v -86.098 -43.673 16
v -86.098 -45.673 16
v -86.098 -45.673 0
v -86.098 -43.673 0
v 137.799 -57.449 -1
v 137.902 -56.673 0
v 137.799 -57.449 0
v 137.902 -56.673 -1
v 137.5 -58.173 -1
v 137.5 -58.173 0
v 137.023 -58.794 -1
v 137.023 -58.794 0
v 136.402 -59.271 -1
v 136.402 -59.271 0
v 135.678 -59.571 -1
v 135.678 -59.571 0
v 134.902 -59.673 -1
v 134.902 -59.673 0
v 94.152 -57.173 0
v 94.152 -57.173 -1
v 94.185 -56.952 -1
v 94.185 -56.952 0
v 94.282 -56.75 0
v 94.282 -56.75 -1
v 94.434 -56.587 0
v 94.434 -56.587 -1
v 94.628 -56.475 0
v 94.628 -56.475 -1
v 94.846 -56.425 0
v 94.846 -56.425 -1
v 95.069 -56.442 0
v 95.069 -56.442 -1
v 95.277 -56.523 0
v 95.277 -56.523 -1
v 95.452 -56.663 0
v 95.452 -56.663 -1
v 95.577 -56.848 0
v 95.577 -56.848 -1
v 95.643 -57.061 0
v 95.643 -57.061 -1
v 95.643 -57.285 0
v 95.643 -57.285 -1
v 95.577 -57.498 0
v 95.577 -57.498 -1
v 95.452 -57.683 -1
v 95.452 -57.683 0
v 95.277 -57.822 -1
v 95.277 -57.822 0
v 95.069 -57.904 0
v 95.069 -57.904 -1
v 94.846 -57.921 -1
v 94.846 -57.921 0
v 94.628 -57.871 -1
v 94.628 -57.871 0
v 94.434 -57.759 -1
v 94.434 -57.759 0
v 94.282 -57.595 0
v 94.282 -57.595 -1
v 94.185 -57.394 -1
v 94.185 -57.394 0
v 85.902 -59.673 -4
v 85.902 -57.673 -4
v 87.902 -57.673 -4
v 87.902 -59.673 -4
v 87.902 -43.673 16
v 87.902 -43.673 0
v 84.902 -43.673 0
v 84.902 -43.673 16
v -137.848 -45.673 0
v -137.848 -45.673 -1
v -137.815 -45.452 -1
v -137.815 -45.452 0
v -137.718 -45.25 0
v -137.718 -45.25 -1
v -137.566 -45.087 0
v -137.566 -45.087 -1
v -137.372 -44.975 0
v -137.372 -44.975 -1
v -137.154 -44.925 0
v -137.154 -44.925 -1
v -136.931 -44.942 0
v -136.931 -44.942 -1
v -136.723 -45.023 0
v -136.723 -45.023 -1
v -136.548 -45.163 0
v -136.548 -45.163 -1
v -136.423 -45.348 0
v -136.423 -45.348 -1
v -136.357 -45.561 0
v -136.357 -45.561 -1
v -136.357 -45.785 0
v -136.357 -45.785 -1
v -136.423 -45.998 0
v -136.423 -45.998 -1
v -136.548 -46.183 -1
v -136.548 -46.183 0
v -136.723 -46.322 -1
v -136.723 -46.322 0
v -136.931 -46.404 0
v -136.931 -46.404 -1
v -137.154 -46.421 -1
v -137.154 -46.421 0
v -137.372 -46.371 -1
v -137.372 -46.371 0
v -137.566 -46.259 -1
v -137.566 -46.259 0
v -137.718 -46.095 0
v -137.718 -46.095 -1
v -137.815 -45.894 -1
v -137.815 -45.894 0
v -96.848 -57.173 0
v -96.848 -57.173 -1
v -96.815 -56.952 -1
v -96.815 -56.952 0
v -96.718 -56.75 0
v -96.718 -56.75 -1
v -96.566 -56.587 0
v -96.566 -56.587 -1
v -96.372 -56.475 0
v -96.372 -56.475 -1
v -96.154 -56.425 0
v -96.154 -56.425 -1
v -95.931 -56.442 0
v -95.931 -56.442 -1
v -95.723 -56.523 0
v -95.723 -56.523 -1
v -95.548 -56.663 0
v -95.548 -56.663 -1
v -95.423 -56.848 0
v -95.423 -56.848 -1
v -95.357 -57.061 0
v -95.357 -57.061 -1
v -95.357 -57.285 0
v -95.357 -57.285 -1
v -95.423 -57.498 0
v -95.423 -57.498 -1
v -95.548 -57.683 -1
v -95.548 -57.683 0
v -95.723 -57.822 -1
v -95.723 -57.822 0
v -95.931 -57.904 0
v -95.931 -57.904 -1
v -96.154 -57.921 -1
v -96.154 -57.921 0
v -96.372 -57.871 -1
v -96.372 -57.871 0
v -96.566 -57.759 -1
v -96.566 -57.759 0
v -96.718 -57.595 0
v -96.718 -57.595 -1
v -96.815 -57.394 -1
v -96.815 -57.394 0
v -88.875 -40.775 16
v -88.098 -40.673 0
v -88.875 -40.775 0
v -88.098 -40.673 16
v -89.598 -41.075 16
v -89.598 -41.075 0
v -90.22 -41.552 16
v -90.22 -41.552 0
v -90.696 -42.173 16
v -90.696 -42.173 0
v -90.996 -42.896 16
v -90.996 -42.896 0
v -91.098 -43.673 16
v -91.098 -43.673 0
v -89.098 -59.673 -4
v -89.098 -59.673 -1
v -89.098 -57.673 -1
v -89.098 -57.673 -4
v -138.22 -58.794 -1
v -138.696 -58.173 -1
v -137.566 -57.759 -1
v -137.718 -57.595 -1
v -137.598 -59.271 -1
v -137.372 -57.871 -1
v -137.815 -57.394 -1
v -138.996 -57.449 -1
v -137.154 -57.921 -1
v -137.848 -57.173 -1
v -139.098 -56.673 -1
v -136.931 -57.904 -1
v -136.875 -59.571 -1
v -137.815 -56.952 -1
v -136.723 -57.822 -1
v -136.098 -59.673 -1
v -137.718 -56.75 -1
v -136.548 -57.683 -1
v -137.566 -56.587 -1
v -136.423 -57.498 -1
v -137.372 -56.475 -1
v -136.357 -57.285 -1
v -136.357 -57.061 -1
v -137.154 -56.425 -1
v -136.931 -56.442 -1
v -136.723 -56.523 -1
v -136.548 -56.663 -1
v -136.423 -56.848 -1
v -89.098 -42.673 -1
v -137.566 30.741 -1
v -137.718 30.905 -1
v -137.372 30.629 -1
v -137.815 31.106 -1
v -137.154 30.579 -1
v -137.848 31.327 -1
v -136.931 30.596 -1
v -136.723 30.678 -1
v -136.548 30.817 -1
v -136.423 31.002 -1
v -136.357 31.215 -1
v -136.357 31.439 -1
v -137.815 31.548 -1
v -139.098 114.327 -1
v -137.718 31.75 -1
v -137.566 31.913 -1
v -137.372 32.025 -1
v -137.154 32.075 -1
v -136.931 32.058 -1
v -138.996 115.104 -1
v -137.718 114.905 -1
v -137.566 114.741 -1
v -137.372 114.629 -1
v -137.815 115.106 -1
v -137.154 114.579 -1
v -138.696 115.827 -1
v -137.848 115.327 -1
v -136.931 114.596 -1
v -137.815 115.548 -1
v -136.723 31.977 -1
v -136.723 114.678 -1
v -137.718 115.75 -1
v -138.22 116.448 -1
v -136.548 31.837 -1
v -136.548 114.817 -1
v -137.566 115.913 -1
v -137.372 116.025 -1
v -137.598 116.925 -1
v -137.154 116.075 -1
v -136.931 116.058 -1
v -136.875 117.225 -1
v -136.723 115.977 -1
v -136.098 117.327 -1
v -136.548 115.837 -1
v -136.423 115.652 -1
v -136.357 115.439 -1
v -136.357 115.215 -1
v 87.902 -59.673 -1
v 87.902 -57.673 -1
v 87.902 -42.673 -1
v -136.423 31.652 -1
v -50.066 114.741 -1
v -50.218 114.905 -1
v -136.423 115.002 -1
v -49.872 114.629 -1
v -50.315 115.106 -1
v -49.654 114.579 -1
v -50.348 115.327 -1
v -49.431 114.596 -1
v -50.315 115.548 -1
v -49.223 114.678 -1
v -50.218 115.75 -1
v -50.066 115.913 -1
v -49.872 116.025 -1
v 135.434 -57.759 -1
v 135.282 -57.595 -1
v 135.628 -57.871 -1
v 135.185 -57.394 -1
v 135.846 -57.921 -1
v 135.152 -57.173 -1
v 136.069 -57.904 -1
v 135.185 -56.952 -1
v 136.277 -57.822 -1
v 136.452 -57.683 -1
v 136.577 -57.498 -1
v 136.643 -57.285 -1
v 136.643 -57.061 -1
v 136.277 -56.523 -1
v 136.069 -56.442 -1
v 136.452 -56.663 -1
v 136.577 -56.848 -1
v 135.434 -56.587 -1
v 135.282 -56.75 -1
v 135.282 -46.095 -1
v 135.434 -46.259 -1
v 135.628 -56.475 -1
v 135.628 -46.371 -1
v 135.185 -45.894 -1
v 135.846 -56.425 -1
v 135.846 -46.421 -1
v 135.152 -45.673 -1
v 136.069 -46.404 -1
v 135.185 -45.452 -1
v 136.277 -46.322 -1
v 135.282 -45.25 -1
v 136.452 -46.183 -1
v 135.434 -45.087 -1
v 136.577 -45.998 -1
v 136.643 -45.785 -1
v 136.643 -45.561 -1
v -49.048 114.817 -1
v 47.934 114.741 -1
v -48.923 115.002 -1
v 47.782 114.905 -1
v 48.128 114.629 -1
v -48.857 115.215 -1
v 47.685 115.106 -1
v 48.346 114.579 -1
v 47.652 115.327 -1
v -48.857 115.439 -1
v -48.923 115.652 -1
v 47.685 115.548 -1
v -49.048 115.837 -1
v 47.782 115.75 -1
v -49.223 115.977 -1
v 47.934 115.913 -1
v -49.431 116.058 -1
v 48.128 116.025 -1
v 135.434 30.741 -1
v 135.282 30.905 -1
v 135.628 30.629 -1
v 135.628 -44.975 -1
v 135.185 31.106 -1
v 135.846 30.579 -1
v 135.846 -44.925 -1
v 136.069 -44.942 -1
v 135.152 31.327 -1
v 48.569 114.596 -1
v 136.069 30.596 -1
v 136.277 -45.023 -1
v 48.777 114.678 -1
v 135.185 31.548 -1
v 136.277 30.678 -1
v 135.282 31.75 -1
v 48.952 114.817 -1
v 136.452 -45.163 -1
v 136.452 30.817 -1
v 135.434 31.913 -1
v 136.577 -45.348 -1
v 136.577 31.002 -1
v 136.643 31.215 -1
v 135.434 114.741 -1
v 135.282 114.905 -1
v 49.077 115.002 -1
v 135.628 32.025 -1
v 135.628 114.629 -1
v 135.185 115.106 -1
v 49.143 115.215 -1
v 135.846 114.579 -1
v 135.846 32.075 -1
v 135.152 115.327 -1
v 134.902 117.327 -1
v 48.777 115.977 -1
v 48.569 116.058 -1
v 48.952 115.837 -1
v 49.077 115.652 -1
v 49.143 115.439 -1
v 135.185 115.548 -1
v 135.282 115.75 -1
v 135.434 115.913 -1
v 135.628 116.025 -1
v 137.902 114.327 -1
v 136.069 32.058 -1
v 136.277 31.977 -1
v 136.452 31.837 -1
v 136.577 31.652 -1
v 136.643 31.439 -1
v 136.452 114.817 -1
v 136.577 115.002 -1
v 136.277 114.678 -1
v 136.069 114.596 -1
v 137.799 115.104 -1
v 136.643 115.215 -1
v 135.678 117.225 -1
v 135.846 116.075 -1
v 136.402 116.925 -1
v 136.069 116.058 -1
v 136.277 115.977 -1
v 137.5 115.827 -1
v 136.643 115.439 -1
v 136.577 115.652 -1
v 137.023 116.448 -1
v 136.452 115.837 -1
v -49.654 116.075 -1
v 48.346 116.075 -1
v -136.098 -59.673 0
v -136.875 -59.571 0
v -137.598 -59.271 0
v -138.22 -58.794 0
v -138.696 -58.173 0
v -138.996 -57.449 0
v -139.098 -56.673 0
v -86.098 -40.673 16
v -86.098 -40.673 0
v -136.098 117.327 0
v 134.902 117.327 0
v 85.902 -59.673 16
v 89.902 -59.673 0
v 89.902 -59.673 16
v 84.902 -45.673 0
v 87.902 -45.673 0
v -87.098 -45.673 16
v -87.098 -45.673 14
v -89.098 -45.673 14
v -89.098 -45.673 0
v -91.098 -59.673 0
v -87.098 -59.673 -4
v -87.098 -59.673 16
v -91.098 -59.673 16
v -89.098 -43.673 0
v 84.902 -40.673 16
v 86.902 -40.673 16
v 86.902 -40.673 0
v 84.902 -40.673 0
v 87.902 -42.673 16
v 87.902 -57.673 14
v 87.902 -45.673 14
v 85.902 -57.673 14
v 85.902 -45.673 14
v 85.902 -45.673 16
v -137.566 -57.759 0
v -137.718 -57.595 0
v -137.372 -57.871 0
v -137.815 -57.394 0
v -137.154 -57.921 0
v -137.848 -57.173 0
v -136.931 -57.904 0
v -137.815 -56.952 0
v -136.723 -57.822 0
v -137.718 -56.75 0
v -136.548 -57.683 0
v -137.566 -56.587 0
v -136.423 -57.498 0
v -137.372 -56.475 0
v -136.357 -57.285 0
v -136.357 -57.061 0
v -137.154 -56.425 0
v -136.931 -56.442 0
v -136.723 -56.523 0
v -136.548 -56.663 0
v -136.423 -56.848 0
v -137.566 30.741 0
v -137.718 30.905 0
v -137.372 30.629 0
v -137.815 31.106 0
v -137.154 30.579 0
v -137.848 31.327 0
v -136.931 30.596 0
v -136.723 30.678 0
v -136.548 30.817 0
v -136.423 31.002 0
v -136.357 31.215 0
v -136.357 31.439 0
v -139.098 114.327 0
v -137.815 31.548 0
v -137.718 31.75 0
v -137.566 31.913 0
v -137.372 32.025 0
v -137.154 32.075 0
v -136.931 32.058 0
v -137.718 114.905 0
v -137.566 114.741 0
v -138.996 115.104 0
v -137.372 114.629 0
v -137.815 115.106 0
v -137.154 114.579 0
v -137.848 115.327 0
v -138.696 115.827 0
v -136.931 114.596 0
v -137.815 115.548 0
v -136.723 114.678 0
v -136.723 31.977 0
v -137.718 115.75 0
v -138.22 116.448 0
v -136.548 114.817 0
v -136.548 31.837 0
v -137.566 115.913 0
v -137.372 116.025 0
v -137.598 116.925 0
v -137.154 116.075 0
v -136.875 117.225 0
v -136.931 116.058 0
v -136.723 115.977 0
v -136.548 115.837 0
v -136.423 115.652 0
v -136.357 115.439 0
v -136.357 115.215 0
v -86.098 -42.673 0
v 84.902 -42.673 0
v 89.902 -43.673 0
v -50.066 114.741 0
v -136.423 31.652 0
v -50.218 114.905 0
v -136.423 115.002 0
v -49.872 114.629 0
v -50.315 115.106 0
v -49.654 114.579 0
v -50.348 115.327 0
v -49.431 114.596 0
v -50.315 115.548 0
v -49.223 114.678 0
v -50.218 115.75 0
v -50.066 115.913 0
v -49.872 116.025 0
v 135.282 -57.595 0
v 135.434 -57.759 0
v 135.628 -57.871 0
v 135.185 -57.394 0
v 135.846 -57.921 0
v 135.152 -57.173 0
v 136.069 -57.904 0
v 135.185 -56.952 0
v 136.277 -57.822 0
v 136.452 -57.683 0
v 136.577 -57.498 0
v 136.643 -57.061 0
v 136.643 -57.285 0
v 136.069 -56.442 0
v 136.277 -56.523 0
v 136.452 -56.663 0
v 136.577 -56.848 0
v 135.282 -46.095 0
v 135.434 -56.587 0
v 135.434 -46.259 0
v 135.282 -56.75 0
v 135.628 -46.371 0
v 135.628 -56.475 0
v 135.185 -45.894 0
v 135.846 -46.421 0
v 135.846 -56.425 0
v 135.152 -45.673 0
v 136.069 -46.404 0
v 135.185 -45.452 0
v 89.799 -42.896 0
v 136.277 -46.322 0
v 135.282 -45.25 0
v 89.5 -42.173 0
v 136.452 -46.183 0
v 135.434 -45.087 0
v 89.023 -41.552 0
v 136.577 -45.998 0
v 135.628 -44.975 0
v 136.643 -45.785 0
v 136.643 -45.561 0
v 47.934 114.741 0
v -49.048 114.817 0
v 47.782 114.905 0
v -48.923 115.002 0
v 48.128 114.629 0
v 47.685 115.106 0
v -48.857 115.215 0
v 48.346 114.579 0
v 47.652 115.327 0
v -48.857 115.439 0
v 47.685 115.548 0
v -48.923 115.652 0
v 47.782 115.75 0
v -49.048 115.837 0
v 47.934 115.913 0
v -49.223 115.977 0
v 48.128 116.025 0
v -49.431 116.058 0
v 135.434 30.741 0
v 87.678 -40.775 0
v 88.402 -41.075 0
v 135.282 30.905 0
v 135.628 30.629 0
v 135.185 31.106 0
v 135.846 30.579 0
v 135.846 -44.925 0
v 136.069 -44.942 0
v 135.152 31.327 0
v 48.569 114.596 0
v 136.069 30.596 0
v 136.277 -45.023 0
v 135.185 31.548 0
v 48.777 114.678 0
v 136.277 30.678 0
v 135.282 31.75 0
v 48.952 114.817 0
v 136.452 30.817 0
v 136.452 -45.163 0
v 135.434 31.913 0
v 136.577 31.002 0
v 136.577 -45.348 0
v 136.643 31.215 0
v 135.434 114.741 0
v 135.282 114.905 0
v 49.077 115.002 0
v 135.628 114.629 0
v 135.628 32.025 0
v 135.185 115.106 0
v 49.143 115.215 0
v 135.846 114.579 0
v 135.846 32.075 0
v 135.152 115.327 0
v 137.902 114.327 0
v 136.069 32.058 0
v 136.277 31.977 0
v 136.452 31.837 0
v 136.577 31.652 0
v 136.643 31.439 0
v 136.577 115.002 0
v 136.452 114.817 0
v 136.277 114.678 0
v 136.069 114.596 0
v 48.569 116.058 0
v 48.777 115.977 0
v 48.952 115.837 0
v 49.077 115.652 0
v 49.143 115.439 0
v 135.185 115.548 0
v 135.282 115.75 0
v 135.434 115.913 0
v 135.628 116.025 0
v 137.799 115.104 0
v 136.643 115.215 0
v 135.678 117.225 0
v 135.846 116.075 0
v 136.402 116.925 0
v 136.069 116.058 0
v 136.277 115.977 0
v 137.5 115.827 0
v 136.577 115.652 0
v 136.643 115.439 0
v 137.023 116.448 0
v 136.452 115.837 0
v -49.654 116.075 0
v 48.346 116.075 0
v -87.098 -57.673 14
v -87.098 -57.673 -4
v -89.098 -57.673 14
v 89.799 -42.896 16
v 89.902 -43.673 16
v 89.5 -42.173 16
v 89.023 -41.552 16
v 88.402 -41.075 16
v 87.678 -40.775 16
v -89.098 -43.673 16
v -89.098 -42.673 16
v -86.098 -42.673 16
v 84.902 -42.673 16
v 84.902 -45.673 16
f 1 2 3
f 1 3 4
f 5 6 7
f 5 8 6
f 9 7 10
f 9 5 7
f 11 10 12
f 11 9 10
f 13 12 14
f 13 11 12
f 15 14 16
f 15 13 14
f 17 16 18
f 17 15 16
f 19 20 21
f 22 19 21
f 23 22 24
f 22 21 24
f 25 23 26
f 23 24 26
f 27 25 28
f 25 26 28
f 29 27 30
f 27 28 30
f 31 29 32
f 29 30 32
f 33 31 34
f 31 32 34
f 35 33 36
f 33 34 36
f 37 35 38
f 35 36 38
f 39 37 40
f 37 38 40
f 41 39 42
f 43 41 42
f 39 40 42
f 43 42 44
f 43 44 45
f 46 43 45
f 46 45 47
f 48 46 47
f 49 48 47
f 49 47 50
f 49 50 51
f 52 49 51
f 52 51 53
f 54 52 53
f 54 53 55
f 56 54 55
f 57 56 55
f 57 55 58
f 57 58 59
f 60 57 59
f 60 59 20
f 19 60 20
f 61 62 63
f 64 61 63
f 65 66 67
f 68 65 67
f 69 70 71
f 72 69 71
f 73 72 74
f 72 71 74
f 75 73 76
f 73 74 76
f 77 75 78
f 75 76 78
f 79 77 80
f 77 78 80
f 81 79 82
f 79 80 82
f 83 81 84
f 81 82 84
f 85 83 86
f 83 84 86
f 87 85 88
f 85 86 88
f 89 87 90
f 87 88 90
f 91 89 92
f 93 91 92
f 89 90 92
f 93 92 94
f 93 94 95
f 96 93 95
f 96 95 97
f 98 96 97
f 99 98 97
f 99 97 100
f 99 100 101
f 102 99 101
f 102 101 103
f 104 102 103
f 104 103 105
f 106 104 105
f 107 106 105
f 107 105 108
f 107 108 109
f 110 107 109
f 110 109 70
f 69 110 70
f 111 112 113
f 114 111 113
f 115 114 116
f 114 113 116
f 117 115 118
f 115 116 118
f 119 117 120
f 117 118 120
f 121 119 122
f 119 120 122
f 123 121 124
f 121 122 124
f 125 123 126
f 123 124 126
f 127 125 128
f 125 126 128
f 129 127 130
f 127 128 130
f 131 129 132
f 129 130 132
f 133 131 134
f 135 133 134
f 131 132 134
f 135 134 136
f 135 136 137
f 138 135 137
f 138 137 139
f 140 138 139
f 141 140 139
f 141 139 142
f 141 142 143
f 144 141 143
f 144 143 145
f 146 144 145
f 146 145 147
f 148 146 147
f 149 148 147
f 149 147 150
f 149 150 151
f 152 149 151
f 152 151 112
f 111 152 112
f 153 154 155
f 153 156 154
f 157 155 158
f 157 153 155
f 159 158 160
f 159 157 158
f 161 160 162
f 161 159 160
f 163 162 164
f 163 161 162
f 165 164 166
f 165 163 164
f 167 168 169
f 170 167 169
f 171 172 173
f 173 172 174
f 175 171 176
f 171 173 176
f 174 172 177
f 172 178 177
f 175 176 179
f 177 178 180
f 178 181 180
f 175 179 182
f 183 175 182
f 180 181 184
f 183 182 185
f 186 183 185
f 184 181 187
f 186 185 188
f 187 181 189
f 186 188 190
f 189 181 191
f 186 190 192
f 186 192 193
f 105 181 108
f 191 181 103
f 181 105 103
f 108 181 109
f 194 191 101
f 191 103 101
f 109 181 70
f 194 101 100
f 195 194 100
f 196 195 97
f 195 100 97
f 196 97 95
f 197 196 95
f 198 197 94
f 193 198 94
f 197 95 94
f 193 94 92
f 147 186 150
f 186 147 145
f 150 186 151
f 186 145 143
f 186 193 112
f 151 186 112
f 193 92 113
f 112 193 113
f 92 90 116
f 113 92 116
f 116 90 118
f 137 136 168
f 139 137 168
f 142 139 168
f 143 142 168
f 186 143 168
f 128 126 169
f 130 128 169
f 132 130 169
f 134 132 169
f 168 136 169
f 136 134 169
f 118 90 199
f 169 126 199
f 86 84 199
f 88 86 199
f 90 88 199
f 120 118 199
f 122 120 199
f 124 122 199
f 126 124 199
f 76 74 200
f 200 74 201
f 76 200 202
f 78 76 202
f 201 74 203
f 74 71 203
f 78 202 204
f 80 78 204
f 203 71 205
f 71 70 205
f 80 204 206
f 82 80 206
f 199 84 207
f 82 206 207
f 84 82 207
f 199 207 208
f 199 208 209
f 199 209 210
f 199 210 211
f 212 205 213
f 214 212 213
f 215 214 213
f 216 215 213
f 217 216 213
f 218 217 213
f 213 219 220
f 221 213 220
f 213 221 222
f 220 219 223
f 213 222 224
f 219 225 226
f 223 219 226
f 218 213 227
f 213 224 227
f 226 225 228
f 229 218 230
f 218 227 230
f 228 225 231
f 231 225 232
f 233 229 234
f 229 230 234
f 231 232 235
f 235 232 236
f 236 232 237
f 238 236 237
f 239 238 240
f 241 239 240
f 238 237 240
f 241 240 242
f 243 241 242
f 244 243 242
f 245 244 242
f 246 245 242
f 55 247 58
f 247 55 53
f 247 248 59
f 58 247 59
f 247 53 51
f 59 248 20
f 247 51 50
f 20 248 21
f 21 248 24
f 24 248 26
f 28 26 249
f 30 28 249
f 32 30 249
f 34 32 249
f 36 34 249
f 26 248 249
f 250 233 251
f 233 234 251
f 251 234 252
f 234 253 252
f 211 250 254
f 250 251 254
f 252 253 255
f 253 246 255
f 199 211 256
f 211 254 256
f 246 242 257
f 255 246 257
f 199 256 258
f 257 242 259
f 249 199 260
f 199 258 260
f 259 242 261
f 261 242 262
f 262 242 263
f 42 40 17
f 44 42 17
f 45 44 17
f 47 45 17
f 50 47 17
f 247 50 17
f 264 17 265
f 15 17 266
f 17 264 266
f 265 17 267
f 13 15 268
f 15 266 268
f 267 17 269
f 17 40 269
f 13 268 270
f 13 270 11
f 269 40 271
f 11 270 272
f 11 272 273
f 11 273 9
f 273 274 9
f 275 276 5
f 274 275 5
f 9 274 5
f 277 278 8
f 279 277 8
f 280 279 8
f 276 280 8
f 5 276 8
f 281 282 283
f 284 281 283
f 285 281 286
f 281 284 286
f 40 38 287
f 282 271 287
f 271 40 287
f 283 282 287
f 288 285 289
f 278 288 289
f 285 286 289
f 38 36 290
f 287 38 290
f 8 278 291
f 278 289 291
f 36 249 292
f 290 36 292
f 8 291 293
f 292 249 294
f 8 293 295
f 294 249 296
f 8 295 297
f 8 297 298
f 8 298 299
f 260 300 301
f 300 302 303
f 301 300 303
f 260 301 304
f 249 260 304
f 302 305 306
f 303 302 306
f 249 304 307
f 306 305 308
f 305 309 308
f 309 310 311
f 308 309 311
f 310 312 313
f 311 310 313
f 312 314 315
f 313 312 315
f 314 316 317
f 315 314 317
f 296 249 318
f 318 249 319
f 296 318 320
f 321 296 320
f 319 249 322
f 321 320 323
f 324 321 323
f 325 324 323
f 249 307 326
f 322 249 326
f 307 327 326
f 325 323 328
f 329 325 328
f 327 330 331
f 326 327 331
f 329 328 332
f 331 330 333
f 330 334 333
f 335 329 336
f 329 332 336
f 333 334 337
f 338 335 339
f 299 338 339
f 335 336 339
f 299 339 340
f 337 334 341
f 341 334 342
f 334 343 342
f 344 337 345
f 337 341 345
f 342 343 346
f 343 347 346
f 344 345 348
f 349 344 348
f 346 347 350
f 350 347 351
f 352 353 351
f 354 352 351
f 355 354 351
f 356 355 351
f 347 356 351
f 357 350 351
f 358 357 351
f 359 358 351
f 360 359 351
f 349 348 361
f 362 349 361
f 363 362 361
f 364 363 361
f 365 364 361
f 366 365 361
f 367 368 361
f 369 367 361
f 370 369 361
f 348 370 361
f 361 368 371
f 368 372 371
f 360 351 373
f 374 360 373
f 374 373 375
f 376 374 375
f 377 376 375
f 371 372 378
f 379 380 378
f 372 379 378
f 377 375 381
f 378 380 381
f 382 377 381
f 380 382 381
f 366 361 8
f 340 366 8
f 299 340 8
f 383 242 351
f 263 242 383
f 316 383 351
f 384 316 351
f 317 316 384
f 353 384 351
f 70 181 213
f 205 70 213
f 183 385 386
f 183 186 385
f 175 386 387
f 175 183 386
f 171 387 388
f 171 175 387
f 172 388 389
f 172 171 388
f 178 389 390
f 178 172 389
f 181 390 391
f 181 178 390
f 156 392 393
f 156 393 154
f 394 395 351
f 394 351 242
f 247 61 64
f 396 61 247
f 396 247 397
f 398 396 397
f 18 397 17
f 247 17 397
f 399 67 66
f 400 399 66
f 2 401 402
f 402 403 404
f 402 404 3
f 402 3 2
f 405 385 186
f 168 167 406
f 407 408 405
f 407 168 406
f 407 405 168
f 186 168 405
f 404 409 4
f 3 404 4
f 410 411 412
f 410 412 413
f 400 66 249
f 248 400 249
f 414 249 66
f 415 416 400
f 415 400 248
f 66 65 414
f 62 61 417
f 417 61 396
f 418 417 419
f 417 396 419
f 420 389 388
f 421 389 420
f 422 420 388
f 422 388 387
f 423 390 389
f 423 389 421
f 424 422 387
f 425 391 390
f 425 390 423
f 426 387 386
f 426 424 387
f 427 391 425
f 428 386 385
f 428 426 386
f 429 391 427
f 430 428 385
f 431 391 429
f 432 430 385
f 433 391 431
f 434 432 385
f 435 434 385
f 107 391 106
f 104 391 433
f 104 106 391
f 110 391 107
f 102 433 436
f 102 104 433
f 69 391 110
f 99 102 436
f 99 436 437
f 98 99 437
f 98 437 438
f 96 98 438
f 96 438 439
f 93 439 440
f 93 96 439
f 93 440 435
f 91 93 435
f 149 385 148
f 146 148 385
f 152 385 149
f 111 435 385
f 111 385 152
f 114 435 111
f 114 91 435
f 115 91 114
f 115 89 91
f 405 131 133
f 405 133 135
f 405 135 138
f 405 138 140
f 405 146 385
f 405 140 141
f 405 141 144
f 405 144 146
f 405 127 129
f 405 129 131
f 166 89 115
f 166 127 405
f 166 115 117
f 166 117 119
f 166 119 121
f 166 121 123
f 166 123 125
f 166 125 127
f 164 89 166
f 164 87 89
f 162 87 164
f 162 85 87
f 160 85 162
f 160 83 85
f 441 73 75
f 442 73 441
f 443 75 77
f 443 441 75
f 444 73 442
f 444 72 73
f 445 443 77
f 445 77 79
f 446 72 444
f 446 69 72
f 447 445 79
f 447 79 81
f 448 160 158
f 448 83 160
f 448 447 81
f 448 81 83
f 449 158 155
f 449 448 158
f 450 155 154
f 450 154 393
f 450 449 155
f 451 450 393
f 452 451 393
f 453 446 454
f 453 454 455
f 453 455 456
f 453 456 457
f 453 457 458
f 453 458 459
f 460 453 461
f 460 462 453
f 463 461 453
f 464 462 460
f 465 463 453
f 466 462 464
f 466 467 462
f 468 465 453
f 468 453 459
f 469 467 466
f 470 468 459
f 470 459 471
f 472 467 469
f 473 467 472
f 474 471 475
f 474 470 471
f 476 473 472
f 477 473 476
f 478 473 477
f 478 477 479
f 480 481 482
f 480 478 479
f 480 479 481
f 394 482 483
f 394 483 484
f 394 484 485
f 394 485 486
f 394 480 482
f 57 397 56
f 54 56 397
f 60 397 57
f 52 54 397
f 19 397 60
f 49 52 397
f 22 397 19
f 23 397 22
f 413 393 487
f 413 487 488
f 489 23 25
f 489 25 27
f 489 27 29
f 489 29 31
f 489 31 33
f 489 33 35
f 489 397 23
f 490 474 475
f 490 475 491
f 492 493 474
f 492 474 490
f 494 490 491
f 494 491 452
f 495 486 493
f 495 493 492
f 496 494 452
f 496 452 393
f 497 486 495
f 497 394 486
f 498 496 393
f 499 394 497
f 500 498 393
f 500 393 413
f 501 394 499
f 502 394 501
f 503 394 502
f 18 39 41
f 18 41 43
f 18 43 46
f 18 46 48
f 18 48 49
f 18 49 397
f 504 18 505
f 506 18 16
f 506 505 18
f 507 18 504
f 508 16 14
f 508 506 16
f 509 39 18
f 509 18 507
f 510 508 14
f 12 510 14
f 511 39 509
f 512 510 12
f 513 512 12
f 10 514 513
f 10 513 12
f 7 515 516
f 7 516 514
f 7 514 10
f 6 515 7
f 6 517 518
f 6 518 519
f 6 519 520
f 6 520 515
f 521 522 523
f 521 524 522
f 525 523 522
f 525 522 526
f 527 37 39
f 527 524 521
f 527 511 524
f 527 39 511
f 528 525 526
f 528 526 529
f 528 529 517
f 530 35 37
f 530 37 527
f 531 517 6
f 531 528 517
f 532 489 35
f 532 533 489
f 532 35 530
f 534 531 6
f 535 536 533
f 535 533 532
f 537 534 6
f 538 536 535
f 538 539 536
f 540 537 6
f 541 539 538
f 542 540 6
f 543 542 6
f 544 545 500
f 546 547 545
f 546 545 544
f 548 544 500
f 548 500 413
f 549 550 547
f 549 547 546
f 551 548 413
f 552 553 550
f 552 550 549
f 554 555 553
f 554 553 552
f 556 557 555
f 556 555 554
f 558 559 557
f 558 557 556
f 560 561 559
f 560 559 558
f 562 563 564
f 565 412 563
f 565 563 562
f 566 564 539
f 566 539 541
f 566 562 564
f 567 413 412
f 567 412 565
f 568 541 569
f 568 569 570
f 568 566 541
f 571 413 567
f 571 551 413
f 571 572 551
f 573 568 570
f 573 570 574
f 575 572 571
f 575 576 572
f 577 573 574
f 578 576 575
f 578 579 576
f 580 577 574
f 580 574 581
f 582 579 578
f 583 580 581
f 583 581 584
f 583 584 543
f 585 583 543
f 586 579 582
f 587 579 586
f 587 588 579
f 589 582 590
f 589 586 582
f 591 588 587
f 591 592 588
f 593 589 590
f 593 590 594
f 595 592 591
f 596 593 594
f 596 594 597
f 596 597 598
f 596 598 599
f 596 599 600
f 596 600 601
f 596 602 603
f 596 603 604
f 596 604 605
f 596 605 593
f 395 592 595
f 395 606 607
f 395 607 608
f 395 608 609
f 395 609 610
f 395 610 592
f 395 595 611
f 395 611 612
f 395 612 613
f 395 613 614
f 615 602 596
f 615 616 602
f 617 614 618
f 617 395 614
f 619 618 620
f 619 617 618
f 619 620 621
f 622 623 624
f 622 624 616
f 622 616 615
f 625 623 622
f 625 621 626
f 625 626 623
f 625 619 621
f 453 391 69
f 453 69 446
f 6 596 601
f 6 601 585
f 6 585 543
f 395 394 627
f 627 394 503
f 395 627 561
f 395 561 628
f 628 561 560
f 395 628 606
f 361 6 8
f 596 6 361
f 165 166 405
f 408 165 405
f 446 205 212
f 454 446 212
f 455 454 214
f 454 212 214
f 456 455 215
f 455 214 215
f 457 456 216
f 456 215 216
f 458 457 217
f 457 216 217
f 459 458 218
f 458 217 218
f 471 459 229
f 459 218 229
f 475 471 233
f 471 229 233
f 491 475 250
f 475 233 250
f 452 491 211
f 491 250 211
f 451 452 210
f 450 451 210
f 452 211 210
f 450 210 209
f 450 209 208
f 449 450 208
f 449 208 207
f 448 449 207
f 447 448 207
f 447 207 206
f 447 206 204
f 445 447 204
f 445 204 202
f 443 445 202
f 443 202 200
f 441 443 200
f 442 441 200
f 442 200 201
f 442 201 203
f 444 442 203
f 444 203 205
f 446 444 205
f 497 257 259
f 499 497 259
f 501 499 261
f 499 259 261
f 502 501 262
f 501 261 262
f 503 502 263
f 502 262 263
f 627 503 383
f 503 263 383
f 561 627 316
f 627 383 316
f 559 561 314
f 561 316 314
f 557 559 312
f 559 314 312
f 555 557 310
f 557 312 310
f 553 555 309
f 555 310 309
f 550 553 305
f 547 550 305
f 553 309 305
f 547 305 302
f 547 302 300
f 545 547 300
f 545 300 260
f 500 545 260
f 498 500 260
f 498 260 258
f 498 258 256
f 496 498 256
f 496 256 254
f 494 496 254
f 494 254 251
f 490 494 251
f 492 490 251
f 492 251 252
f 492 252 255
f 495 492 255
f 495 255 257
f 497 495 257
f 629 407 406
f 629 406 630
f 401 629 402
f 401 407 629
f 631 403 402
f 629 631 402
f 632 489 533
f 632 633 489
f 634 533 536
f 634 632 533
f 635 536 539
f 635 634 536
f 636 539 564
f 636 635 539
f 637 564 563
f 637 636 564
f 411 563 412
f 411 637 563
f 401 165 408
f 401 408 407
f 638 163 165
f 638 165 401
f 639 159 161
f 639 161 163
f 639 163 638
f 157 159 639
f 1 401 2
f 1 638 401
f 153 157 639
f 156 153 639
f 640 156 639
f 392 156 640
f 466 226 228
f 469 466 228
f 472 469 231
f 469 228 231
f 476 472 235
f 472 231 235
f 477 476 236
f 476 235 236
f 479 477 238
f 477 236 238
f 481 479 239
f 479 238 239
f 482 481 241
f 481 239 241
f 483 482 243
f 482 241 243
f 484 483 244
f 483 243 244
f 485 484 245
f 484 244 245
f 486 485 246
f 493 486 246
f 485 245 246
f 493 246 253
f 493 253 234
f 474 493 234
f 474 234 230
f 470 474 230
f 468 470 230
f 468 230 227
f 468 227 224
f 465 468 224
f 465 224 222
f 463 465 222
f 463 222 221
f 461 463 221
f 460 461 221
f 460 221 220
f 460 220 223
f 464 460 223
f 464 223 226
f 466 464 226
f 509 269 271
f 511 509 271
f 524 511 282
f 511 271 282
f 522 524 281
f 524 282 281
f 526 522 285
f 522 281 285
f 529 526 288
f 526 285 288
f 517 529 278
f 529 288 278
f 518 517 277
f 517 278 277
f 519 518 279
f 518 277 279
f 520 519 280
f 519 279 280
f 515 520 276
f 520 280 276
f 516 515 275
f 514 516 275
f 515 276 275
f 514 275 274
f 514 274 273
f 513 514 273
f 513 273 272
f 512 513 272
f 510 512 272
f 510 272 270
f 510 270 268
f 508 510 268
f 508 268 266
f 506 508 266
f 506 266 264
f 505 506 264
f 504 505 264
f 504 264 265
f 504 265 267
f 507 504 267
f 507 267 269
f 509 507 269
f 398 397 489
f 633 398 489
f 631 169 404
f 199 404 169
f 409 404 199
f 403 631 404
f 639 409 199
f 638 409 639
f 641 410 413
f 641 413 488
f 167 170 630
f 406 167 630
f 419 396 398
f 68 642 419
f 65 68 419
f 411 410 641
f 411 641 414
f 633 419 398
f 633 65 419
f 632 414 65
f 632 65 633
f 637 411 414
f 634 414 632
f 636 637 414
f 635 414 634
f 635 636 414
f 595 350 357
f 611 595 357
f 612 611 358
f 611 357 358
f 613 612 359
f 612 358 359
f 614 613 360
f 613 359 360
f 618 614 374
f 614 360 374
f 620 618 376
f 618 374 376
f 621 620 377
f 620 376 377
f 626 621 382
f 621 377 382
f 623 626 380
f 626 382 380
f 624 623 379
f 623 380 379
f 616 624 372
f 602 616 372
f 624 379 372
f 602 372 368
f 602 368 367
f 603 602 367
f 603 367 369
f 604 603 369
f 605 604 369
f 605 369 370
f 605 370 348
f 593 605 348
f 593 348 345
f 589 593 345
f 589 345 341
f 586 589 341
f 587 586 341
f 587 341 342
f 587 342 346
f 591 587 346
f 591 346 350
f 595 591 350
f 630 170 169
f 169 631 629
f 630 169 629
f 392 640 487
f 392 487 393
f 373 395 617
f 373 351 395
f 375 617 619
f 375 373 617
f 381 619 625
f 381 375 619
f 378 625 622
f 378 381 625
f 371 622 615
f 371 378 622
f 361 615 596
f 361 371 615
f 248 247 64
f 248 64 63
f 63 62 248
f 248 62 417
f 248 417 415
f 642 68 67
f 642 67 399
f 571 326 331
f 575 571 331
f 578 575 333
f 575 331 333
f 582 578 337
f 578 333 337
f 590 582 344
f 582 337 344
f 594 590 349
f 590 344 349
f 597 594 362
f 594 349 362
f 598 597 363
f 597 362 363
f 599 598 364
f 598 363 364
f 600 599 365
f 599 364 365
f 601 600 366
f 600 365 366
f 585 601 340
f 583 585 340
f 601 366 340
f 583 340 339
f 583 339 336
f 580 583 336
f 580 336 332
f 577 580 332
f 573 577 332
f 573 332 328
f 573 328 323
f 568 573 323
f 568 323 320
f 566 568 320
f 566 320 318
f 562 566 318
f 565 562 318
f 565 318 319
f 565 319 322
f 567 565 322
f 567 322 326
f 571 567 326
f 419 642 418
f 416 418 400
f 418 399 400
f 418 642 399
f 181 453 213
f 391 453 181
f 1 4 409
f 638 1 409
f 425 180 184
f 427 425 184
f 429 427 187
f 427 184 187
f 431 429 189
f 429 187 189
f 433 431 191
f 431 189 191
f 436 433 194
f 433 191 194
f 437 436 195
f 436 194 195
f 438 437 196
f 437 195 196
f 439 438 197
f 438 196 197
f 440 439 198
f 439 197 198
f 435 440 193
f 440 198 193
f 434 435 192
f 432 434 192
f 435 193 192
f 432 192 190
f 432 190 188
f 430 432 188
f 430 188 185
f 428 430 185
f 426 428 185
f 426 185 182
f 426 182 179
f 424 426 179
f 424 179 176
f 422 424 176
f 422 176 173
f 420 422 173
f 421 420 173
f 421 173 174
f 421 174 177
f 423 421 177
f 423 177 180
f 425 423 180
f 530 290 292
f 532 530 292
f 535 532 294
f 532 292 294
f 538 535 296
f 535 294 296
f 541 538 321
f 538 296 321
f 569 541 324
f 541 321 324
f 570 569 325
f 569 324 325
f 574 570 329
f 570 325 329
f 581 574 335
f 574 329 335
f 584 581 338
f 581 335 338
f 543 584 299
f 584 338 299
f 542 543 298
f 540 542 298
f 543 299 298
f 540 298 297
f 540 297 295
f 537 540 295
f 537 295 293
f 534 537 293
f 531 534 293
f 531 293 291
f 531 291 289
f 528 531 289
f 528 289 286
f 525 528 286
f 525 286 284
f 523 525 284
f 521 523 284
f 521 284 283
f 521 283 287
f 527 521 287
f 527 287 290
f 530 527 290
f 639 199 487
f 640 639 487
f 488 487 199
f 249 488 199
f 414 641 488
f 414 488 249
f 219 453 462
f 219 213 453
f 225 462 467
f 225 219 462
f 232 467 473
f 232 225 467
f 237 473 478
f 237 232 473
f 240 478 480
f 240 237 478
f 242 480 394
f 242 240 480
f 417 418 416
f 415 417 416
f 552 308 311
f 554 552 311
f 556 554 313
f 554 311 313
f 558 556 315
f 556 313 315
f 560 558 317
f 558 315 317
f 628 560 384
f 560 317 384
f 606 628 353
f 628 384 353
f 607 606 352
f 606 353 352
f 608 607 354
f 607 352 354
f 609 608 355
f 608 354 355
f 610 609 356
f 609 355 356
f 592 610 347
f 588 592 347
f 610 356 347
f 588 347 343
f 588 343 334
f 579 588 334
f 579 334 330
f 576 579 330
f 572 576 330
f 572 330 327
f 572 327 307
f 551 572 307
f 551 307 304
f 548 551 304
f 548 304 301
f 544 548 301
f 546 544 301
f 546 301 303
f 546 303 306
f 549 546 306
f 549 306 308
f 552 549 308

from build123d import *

# Parameters (mm, degrees)
F2_DEPTH = 16
F4_DEPTH = 1
F5_W     = 2
F5_H     = 2
F6_DEPTH = 20
F7_W     = 2
F7_H     = 12
F8_DEPTH = 2
F10_D    = 1.5
F11_R    = 3


with BuildPart() as f2:
    # F1 (on Top) → F2 (new body)
    with BuildSketch(Plane.XY):
        Polygon((-91.098284, -40.672917), (-91.098284, -59.672917), (-89.098284, -59.672917), (-89.098284, -45.672917), (-86.098284, -45.672917), (-86.098284, -43.672917), (-89.098284, -43.672917), (-89.098284, -42.672917), (-86.098284, -42.672917), (-86.098284, -40.672917), align=None)
        Polygon((84.901716, -42.672917), (87.901716, -42.672917), (87.901716, -43.672917), (84.901716, -43.672917), (84.901716, -45.672917), (87.901716, -45.672917), (87.901716, -59.672917), (89.901716, -59.672917), (89.901716, -40.672917), (84.901716, -40.672917), align=None)
    extrude(amount=F2_DEPTH)

    # F3 (on Top) → F4 (join)
    with BuildSketch(Plane.XY):
        Polygon((-139.098284, -59.672917), (-89.098284, -59.672917), (-89.098284, -42.672917), (87.901716, -42.672917), (87.901716, -59.672917), (137.901716, -59.672917), (137.901716, 117.327083), (-139.098284, 117.327083), align=None)
    extrude(amount=-F4_DEPTH)

    # F5 (on face) → F6 (join)
    with BuildSketch(Plane.XY.offset(16)):
        with Locations((-88.098284, -58.672917)):
            Rectangle(F5_W, F5_H)
        with Locations((86.901716, -58.672917)):
            Rectangle(F5_W, F5_H)
    extrude(amount=-F6_DEPTH)

    # F7 (on face) → F8 (join)
    with BuildSketch(Plane.XY.offset(16)):
        with Locations((-88.098284, -51.672917)):
            Rectangle(F7_W, F7_H)
        with Locations((86.901716, -51.672917)):
            Rectangle(F7_W, F7_H)
    extrude(amount=-F8_DEPTH)

    # F10 (through all)
    with Locations(Plane.XY):
        with Locations((-49.598284, 115.327083), (-137.098284, 31.327083), (-137.098284, -57.172917), (-137.098284, -45.672917), (-137.098284, 115.327083), (135.901716, -45.672917), (-96.098284, -57.172917), (94.901716, -57.172917), (135.901716, -57.172917), (48.401716, 115.327083), (135.901716, 115.327083), (135.901716, 31.327083)):
            Hole(F10_D / 2)

    # F11
    f11_edges = [f2.edges().sort_by_distance(p)[0] for p in [
        (-139.098284, 117.327083, -0.5),
        (137.901716, 117.327083, -0.5),
        (-91.098284, -40.672917, 8),
        (-139.098284, -59.672917, -0.5),
        (89.901716, -40.672917, 8),
        (137.901716, -59.672917, -0.5),
    ]]
    fillet(f11_edges, radius=F11_R)


solid = f2.part
